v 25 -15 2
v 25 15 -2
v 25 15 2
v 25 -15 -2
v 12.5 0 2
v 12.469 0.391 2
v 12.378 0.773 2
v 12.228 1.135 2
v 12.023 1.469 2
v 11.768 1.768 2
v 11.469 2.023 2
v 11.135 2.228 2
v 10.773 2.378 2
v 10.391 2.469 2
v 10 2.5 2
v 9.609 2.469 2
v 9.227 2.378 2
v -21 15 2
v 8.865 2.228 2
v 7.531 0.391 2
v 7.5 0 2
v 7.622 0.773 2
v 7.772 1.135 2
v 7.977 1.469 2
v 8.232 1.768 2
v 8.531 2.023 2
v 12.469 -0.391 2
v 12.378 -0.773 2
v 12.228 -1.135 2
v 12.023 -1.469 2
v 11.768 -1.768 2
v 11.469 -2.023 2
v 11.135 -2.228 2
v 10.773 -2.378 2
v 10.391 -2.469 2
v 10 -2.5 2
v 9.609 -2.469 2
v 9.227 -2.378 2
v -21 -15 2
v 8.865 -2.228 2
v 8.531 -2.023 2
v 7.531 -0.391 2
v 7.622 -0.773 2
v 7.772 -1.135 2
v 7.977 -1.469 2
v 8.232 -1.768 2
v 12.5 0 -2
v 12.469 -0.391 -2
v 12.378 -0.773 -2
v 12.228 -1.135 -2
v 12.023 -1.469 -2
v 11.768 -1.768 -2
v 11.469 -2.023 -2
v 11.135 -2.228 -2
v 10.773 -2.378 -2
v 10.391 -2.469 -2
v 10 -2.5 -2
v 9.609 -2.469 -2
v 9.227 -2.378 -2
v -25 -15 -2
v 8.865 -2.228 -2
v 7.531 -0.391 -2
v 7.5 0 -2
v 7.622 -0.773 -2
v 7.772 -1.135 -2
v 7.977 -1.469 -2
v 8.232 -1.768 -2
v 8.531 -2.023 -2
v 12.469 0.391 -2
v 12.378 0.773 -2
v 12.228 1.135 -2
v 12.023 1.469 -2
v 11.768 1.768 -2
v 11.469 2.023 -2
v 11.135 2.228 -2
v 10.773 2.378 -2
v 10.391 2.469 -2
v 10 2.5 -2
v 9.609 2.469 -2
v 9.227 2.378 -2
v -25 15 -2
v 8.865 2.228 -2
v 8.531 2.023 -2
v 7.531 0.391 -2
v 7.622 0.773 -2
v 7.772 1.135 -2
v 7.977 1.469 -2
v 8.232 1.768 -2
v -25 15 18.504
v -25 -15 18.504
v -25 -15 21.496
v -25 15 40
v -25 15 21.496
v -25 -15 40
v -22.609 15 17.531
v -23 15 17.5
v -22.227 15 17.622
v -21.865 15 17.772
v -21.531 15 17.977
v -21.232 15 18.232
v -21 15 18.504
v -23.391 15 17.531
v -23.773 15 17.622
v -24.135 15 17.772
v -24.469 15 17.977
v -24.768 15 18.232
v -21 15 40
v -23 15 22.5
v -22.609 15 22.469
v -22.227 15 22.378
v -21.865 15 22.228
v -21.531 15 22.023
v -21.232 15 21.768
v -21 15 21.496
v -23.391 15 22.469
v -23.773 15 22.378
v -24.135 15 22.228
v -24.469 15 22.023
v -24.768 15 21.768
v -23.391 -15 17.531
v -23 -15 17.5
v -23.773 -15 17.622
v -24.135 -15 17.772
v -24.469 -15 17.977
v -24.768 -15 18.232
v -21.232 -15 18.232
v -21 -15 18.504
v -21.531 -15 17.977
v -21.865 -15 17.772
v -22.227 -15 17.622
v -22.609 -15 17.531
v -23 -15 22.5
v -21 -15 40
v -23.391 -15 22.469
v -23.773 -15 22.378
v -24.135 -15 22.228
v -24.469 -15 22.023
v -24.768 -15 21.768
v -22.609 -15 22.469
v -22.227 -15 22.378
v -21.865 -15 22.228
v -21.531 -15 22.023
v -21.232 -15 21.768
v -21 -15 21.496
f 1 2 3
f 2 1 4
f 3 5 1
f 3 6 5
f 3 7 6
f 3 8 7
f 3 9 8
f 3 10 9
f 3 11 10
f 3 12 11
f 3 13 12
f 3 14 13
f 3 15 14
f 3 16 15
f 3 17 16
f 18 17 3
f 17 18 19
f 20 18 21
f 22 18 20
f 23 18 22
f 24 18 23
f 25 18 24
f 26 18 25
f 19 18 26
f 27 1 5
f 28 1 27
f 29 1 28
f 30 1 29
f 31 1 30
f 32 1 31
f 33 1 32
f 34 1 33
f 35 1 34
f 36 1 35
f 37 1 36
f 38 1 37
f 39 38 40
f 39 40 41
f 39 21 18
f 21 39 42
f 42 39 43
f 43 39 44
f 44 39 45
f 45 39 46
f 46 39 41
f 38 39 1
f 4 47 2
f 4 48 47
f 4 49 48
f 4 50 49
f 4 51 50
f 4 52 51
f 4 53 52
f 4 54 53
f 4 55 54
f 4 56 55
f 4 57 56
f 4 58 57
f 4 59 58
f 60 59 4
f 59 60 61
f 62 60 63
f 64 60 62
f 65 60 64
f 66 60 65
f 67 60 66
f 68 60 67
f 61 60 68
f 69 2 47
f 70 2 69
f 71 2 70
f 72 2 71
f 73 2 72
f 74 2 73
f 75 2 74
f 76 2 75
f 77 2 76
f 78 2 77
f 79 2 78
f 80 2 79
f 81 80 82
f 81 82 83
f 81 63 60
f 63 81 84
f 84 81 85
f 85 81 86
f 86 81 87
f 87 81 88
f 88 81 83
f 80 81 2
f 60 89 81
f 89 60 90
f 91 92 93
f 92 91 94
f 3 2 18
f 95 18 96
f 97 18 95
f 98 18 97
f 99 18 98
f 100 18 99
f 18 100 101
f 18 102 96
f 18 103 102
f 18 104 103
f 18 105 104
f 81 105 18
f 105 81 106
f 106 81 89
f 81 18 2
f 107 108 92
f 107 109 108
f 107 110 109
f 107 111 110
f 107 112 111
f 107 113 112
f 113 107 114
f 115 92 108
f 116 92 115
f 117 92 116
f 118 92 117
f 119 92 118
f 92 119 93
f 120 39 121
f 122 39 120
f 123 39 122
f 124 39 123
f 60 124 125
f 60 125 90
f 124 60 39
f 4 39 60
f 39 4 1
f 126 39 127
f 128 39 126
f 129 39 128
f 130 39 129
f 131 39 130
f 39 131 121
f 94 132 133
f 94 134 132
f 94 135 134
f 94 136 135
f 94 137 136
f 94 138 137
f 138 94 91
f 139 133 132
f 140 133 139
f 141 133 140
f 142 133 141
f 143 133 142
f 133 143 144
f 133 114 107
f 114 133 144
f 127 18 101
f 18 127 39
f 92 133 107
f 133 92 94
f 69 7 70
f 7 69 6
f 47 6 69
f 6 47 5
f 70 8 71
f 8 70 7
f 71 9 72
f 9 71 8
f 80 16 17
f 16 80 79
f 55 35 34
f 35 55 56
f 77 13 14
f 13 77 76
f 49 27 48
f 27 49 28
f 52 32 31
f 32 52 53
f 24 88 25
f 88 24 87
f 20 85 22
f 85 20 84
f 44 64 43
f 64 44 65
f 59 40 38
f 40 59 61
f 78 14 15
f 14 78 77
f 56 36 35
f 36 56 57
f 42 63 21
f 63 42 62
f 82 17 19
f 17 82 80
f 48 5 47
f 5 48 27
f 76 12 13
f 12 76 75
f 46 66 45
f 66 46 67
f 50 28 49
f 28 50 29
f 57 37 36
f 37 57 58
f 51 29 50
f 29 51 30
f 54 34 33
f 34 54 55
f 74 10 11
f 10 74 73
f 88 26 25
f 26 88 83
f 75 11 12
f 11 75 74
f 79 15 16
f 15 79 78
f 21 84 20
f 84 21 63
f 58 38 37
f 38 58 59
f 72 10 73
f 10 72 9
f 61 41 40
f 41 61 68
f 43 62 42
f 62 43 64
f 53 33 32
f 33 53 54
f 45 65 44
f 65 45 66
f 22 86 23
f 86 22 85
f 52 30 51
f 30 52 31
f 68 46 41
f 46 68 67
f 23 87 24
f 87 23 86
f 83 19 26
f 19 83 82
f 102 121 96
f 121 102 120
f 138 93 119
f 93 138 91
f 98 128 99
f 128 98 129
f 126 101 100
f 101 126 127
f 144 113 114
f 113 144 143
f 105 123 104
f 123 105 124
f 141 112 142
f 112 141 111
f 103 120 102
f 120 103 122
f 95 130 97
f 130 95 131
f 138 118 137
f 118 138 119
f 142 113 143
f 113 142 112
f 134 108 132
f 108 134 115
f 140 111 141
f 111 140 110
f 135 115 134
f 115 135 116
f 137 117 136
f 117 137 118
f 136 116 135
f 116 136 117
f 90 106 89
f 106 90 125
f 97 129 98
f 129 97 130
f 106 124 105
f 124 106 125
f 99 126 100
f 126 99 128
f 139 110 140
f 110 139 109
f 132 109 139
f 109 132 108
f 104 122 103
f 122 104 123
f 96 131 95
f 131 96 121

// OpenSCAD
thickness = 4;
leg_a = 50;
leg_b = 40;
width = 30;

hole_diameter = 5;
hole_offset = 20;

module l_bracket() {
    difference() {
        union() {
            // Base horizontal
            translate([0, 0, 0])
                cube([leg_a, width, thickness], center = true);

            // Parede vertical
            translate([-leg_a / 2 + thickness / 2, 0, leg_b / 2])
                cube([thickness, width, leg_b], center = true);
        }

        // Furo na base
        translate([hole_offset / 2, 0, 0])
            cylinder(h = thickness + 2, d = hole_diameter, center = true, $fn = 40);

        // Furo na parede vertical
        translate([-leg_a / 2 + thickness / 2, 0, leg_b / 2])
            rotate([90, 0, 0])
                cylinder(h = width + 2, d = hole_diameter, center = true, $fn = 40);
    }
}

l_bracket();
